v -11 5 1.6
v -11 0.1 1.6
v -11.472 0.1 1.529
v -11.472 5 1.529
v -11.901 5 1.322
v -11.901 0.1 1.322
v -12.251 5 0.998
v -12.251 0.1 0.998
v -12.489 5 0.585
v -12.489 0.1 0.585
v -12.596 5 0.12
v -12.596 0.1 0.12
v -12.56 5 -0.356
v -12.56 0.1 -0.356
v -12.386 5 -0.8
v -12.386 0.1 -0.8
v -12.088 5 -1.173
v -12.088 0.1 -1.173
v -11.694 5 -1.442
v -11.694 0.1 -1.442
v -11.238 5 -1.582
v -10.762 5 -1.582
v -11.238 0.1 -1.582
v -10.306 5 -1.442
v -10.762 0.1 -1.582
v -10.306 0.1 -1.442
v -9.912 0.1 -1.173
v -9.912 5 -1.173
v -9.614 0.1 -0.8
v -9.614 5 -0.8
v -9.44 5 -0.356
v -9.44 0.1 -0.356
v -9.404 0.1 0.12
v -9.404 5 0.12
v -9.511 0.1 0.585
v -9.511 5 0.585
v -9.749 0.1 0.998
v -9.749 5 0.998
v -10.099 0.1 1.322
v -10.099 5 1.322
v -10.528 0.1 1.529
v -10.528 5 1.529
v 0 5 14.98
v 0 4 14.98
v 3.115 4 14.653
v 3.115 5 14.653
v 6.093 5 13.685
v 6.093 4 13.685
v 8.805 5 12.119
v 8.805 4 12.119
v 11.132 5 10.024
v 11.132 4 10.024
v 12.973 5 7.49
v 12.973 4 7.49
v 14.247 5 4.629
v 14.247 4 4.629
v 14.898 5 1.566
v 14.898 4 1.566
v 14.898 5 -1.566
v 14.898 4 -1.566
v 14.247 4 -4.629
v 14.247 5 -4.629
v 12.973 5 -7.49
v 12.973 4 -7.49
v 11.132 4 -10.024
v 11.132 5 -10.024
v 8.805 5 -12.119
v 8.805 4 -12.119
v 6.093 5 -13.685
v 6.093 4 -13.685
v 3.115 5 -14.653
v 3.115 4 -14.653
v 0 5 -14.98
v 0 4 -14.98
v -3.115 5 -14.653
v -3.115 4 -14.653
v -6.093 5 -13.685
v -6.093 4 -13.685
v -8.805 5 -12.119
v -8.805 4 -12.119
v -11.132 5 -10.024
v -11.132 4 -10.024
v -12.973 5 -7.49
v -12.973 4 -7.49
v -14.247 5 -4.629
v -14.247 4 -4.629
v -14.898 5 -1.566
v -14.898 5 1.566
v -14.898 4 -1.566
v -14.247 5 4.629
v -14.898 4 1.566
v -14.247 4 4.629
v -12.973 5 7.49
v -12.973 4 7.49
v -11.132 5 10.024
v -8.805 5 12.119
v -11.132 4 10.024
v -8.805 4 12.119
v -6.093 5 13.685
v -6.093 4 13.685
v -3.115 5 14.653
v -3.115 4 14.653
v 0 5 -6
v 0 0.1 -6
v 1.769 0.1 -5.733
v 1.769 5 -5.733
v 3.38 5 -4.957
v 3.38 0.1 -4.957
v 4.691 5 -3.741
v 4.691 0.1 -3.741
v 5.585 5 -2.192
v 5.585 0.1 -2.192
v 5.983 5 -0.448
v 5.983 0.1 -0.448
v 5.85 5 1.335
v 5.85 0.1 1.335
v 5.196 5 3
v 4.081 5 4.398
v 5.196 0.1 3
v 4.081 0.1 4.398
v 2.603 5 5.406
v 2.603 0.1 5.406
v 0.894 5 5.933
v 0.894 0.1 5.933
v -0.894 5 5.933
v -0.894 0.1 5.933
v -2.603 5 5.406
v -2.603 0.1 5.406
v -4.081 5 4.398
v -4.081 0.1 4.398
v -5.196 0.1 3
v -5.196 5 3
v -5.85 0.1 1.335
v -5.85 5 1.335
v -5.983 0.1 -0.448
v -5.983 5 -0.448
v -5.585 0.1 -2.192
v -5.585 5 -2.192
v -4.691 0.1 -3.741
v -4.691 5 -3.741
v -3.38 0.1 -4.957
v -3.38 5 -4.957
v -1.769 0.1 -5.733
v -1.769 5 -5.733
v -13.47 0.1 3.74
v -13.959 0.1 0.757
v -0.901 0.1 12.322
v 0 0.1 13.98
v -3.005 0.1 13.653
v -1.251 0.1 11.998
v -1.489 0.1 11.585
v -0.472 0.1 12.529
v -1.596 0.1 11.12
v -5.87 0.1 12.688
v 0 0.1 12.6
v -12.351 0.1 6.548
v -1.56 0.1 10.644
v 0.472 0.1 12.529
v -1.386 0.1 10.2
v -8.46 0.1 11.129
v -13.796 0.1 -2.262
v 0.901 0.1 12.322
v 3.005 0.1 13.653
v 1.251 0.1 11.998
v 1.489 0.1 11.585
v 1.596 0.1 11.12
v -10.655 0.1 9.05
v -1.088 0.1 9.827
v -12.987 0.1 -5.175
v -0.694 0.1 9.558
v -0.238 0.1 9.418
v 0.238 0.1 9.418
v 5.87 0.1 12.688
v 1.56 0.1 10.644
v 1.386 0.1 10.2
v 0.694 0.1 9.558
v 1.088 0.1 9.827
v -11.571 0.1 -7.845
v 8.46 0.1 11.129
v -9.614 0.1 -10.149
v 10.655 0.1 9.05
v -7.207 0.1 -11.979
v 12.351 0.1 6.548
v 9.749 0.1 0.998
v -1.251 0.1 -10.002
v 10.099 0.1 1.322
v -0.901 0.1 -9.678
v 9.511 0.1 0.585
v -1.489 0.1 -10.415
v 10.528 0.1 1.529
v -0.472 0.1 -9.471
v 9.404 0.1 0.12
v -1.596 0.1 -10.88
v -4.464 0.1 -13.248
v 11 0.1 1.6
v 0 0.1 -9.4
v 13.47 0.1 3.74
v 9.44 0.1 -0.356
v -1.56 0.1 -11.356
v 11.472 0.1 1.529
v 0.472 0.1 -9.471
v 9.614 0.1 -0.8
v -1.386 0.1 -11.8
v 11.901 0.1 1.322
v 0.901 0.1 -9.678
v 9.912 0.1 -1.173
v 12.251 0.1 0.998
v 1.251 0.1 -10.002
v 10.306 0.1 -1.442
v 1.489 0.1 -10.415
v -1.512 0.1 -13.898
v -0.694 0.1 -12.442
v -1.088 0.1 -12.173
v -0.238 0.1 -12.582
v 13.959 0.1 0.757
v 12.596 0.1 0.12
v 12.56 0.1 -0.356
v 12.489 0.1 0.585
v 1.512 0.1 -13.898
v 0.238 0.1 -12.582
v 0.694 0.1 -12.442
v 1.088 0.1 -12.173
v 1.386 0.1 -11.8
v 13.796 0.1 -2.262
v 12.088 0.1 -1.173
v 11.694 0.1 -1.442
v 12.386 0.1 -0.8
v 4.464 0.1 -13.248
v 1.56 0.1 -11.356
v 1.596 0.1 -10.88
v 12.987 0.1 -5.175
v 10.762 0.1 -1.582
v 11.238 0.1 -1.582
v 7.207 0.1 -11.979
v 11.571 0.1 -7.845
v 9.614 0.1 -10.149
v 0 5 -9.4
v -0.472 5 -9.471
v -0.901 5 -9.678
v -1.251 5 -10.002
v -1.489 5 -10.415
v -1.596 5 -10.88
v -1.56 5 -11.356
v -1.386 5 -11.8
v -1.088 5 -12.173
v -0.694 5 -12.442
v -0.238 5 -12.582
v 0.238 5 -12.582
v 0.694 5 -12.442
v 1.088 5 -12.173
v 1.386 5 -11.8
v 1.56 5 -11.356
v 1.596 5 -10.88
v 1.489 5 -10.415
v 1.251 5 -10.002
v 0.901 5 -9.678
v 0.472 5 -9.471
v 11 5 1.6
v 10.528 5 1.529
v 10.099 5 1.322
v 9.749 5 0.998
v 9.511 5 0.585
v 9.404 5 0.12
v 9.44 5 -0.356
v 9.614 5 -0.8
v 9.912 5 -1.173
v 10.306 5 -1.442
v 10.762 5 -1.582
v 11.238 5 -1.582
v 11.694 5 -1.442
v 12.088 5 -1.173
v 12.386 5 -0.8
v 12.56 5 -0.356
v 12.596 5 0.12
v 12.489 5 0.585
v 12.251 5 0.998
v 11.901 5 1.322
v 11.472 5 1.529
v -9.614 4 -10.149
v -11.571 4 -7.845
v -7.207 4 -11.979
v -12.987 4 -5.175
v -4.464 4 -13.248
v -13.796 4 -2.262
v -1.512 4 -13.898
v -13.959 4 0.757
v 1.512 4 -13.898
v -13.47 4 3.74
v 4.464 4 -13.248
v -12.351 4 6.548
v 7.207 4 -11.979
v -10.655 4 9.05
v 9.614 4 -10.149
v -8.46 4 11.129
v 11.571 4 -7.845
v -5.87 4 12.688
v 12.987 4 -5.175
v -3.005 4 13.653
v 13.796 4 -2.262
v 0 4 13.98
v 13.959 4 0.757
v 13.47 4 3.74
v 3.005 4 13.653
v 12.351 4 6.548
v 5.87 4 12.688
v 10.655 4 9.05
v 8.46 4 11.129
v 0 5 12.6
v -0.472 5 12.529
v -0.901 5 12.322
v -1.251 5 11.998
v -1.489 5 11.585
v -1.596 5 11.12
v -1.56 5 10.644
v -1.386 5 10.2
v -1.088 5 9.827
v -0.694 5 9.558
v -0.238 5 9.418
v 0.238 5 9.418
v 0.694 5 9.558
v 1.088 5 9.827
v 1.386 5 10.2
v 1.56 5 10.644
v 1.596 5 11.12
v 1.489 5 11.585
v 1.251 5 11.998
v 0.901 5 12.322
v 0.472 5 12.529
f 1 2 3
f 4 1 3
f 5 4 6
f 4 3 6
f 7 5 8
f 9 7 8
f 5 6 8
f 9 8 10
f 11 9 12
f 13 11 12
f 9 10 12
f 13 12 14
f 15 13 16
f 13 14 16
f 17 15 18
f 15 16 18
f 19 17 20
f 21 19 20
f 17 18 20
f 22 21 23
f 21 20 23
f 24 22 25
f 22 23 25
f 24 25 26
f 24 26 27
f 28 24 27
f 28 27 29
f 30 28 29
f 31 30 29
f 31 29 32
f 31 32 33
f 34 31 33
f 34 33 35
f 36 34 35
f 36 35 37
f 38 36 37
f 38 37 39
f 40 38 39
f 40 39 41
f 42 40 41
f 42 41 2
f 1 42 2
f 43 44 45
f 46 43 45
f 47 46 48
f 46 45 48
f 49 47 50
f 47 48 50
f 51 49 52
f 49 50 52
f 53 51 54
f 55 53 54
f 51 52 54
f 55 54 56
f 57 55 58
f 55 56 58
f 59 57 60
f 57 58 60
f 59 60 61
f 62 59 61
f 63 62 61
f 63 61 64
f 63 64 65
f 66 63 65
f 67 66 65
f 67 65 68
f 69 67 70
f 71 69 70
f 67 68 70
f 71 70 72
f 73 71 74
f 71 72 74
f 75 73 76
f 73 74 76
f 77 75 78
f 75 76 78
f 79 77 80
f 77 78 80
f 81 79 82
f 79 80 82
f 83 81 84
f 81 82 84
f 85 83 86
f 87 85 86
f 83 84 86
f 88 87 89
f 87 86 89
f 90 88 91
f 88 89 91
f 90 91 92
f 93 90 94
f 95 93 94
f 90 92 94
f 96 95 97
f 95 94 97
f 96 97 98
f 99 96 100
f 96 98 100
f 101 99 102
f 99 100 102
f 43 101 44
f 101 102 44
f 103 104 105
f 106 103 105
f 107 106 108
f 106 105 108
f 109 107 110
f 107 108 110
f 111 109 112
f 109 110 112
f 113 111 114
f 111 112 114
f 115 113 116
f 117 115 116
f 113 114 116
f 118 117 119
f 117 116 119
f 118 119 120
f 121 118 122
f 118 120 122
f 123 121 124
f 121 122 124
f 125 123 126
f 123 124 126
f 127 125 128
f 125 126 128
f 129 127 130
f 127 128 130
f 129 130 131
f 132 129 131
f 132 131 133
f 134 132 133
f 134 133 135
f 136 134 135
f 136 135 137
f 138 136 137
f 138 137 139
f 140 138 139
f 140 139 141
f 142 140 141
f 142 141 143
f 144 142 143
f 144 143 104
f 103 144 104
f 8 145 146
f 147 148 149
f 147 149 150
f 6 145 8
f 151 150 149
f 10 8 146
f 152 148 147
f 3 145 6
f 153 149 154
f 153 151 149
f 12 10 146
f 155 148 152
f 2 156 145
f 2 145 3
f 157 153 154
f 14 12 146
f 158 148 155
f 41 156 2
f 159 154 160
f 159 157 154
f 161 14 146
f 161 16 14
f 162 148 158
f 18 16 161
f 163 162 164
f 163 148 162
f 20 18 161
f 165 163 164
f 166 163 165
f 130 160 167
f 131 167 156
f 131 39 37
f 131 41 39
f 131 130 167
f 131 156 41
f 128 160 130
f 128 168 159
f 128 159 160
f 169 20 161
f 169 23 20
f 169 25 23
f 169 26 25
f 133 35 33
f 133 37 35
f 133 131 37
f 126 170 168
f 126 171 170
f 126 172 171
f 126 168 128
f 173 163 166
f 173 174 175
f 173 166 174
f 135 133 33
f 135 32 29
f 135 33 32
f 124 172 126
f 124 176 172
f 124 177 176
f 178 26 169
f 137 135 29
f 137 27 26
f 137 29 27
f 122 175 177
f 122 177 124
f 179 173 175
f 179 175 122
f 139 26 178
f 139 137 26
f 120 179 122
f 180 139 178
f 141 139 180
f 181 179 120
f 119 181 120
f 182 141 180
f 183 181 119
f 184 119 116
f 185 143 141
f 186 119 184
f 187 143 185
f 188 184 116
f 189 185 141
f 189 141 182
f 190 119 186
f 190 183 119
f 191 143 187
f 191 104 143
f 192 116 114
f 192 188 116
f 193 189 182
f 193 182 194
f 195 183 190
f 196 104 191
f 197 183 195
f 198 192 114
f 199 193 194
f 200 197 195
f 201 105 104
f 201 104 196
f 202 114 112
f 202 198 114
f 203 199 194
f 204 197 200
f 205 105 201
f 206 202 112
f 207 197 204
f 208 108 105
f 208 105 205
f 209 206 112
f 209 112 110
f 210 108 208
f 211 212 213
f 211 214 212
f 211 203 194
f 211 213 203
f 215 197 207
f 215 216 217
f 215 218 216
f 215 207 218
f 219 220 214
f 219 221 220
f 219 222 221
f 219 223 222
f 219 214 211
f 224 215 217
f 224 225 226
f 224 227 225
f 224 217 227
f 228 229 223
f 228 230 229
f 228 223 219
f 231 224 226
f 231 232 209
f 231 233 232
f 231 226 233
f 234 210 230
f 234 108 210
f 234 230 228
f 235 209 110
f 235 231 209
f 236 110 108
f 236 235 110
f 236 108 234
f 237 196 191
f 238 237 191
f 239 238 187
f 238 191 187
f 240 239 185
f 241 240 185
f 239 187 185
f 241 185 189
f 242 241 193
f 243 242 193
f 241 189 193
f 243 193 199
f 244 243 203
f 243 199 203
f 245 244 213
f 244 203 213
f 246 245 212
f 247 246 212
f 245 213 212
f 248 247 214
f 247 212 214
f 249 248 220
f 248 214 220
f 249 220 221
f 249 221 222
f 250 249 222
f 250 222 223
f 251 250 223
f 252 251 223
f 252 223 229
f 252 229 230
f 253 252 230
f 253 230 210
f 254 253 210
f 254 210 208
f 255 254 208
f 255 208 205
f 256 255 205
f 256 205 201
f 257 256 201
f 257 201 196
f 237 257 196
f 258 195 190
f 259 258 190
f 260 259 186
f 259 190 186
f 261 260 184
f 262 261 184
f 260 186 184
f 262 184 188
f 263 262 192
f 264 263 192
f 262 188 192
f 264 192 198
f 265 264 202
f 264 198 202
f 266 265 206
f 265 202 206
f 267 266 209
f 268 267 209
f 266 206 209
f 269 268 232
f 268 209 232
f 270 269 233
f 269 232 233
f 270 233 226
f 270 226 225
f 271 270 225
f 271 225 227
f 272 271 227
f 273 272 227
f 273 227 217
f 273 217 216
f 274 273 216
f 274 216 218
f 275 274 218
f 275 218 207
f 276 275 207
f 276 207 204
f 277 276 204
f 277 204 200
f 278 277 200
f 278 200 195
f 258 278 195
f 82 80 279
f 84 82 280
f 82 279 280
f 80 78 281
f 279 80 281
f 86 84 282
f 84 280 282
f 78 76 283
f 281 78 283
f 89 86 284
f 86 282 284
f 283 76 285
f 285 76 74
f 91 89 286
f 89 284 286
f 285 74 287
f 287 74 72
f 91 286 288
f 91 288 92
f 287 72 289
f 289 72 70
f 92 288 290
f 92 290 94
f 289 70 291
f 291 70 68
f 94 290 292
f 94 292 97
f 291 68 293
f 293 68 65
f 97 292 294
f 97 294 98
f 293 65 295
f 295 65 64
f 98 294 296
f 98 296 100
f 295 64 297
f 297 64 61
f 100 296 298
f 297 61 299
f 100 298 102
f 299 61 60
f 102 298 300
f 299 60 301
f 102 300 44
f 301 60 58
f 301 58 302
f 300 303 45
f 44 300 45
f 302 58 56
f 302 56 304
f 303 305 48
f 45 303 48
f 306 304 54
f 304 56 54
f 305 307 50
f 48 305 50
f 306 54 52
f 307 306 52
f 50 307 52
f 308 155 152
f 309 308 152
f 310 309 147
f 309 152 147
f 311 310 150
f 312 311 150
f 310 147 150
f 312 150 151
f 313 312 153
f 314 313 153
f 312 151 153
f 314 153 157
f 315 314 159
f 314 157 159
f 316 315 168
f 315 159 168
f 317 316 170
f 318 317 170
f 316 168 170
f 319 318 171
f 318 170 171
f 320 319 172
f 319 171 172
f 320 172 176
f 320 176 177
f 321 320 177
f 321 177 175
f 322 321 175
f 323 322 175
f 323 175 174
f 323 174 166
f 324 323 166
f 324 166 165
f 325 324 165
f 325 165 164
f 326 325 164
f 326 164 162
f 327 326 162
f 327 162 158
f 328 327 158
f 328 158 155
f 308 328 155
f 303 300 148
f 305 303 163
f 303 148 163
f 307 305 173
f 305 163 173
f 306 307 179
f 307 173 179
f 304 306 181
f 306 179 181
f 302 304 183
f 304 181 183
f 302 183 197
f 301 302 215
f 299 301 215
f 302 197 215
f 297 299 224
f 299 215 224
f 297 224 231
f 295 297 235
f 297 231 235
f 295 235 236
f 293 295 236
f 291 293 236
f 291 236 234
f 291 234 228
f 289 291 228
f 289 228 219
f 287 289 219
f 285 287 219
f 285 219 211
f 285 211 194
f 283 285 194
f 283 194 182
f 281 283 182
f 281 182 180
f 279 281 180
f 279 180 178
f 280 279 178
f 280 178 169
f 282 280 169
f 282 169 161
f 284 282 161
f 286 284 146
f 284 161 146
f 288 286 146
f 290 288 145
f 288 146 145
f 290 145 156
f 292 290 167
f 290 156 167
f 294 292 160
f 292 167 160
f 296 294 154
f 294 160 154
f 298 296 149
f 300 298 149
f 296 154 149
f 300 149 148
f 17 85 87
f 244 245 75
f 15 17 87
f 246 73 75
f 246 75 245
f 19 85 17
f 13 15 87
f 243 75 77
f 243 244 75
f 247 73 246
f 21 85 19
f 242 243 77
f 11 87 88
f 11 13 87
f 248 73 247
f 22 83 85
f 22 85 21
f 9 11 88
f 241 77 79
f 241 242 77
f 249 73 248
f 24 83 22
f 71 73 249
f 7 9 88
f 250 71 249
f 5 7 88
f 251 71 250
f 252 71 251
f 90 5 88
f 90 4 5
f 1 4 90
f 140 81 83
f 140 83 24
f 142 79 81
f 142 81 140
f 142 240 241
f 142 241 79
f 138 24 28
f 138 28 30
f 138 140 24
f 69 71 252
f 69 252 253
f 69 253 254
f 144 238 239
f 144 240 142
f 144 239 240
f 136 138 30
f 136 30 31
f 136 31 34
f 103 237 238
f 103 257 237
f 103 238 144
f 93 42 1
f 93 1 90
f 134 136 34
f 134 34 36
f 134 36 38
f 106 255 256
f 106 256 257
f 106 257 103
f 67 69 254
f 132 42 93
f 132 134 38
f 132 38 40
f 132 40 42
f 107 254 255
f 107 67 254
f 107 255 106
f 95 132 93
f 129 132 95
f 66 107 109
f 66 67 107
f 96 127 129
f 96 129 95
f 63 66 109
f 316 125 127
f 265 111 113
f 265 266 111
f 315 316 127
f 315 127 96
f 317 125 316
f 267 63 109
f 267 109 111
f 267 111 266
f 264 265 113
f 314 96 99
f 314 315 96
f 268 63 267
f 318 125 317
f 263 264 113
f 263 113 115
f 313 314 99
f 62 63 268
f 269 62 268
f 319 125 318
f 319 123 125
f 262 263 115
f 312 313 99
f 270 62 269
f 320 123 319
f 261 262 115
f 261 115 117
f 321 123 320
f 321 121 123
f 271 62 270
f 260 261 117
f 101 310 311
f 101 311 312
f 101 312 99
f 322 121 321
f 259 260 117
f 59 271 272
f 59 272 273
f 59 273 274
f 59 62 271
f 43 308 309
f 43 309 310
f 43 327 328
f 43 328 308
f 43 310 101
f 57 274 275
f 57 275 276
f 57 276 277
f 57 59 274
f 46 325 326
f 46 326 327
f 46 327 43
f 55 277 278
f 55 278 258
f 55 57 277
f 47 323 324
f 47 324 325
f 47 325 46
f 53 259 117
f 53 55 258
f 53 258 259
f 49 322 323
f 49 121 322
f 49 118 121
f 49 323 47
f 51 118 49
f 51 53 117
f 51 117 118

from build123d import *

# Parameters (mm, degrees)
SKETCH_1_R               = 13.98
EXTRUDE_1_DEPTH          = 4
SKETCH_2_R               = 14.98
EXTRUDE_2_DEPTH          = 1
SKETCH_3_R               = 7.97
EXTRUDE_3_DEPTH          = 2
SKETCH_5_R               = 6
SKETCH_5_R_2             = 1.6
CUT_EXTRUDE_1_DEPTH      = 21
SKETCH_7_R               = 13.98
SKETCH_7_R_2             = 7.97
CUT_EXTRUDE_4_DEPTH      = 0.1
CUT_EXTRUDE_5_DEPTH      = 10
CUT_EXTRUDE_5_DEPTH_BACK = 10
SKETCH_8_W               = 15.94
SKETCH_8_H               = 2.1


with BuildPart() as part:
    # 草图1 → 凸台-拉伸1 (new body)
    with BuildSketch(Plane(origin=(0, 0, 0), x_dir=(1, 0, 0), z_dir=(0, 1, 0))):
        Circle(SKETCH_1_R)
    extrude(amount=EXTRUDE_1_DEPTH)

    # 草图2 → 凸台-拉伸2 (add)
    with BuildSketch(Plane(origin=(0, 4, 0), x_dir=(1, 0, 0), z_dir=(0, 1, 0))):
        Circle(SKETCH_2_R)
    extrude(amount=EXTRUDE_2_DEPTH)

    # 草图3 → 凸台-拉伸3 (add)
    with BuildSketch(Plane.XZ):
        Circle(SKETCH_3_R)
    extrude(amount=EXTRUDE_3_DEPTH)

    # 草图5 → 切除-拉伸1 (cut)
    with BuildSketch(Plane.XZ.offset(2)):
        Circle(SKETCH_5_R)
        with Locations((0, 11)):
            Circle(SKETCH_5_R_2)
        with Locations((11, 0)):
            Circle(SKETCH_5_R_2)
        with Locations((0, -11)):
            Circle(SKETCH_5_R_2)
        with Locations((-11, 0)):
            Circle(SKETCH_5_R_2)
    extrude(amount=-CUT_EXTRUDE_1_DEPTH, mode=Mode.SUBTRACT)

    # 草图7 → 切除-拉伸4 (cut)
    with BuildSketch(Plane.XZ):
        Circle(SKETCH_7_R)
        Circle(SKETCH_7_R_2, mode=Mode.SUBTRACT)
    extrude(amount=-CUT_EXTRUDE_4_DEPTH, mode=Mode.SUBTRACT)

    # 草图8 → 切除-拉伸5 (cut, two sides: drawn at the far end of the back side and taken through both)
    with BuildSketch(Plane(origin=(0, 0, 0), x_dir=(0, 0, -1), z_dir=(1, 0, 0)).offset(-CUT_EXTRUDE_5_DEPTH_BACK)):
        with Locations((0, -0.95)):
            Rectangle(SKETCH_8_W, SKETCH_8_H)
    extrude(amount=CUT_EXTRUDE_5_DEPTH + CUT_EXTRUDE_5_DEPTH_BACK, mode=Mode.SUBTRACT)


solid = part.part
